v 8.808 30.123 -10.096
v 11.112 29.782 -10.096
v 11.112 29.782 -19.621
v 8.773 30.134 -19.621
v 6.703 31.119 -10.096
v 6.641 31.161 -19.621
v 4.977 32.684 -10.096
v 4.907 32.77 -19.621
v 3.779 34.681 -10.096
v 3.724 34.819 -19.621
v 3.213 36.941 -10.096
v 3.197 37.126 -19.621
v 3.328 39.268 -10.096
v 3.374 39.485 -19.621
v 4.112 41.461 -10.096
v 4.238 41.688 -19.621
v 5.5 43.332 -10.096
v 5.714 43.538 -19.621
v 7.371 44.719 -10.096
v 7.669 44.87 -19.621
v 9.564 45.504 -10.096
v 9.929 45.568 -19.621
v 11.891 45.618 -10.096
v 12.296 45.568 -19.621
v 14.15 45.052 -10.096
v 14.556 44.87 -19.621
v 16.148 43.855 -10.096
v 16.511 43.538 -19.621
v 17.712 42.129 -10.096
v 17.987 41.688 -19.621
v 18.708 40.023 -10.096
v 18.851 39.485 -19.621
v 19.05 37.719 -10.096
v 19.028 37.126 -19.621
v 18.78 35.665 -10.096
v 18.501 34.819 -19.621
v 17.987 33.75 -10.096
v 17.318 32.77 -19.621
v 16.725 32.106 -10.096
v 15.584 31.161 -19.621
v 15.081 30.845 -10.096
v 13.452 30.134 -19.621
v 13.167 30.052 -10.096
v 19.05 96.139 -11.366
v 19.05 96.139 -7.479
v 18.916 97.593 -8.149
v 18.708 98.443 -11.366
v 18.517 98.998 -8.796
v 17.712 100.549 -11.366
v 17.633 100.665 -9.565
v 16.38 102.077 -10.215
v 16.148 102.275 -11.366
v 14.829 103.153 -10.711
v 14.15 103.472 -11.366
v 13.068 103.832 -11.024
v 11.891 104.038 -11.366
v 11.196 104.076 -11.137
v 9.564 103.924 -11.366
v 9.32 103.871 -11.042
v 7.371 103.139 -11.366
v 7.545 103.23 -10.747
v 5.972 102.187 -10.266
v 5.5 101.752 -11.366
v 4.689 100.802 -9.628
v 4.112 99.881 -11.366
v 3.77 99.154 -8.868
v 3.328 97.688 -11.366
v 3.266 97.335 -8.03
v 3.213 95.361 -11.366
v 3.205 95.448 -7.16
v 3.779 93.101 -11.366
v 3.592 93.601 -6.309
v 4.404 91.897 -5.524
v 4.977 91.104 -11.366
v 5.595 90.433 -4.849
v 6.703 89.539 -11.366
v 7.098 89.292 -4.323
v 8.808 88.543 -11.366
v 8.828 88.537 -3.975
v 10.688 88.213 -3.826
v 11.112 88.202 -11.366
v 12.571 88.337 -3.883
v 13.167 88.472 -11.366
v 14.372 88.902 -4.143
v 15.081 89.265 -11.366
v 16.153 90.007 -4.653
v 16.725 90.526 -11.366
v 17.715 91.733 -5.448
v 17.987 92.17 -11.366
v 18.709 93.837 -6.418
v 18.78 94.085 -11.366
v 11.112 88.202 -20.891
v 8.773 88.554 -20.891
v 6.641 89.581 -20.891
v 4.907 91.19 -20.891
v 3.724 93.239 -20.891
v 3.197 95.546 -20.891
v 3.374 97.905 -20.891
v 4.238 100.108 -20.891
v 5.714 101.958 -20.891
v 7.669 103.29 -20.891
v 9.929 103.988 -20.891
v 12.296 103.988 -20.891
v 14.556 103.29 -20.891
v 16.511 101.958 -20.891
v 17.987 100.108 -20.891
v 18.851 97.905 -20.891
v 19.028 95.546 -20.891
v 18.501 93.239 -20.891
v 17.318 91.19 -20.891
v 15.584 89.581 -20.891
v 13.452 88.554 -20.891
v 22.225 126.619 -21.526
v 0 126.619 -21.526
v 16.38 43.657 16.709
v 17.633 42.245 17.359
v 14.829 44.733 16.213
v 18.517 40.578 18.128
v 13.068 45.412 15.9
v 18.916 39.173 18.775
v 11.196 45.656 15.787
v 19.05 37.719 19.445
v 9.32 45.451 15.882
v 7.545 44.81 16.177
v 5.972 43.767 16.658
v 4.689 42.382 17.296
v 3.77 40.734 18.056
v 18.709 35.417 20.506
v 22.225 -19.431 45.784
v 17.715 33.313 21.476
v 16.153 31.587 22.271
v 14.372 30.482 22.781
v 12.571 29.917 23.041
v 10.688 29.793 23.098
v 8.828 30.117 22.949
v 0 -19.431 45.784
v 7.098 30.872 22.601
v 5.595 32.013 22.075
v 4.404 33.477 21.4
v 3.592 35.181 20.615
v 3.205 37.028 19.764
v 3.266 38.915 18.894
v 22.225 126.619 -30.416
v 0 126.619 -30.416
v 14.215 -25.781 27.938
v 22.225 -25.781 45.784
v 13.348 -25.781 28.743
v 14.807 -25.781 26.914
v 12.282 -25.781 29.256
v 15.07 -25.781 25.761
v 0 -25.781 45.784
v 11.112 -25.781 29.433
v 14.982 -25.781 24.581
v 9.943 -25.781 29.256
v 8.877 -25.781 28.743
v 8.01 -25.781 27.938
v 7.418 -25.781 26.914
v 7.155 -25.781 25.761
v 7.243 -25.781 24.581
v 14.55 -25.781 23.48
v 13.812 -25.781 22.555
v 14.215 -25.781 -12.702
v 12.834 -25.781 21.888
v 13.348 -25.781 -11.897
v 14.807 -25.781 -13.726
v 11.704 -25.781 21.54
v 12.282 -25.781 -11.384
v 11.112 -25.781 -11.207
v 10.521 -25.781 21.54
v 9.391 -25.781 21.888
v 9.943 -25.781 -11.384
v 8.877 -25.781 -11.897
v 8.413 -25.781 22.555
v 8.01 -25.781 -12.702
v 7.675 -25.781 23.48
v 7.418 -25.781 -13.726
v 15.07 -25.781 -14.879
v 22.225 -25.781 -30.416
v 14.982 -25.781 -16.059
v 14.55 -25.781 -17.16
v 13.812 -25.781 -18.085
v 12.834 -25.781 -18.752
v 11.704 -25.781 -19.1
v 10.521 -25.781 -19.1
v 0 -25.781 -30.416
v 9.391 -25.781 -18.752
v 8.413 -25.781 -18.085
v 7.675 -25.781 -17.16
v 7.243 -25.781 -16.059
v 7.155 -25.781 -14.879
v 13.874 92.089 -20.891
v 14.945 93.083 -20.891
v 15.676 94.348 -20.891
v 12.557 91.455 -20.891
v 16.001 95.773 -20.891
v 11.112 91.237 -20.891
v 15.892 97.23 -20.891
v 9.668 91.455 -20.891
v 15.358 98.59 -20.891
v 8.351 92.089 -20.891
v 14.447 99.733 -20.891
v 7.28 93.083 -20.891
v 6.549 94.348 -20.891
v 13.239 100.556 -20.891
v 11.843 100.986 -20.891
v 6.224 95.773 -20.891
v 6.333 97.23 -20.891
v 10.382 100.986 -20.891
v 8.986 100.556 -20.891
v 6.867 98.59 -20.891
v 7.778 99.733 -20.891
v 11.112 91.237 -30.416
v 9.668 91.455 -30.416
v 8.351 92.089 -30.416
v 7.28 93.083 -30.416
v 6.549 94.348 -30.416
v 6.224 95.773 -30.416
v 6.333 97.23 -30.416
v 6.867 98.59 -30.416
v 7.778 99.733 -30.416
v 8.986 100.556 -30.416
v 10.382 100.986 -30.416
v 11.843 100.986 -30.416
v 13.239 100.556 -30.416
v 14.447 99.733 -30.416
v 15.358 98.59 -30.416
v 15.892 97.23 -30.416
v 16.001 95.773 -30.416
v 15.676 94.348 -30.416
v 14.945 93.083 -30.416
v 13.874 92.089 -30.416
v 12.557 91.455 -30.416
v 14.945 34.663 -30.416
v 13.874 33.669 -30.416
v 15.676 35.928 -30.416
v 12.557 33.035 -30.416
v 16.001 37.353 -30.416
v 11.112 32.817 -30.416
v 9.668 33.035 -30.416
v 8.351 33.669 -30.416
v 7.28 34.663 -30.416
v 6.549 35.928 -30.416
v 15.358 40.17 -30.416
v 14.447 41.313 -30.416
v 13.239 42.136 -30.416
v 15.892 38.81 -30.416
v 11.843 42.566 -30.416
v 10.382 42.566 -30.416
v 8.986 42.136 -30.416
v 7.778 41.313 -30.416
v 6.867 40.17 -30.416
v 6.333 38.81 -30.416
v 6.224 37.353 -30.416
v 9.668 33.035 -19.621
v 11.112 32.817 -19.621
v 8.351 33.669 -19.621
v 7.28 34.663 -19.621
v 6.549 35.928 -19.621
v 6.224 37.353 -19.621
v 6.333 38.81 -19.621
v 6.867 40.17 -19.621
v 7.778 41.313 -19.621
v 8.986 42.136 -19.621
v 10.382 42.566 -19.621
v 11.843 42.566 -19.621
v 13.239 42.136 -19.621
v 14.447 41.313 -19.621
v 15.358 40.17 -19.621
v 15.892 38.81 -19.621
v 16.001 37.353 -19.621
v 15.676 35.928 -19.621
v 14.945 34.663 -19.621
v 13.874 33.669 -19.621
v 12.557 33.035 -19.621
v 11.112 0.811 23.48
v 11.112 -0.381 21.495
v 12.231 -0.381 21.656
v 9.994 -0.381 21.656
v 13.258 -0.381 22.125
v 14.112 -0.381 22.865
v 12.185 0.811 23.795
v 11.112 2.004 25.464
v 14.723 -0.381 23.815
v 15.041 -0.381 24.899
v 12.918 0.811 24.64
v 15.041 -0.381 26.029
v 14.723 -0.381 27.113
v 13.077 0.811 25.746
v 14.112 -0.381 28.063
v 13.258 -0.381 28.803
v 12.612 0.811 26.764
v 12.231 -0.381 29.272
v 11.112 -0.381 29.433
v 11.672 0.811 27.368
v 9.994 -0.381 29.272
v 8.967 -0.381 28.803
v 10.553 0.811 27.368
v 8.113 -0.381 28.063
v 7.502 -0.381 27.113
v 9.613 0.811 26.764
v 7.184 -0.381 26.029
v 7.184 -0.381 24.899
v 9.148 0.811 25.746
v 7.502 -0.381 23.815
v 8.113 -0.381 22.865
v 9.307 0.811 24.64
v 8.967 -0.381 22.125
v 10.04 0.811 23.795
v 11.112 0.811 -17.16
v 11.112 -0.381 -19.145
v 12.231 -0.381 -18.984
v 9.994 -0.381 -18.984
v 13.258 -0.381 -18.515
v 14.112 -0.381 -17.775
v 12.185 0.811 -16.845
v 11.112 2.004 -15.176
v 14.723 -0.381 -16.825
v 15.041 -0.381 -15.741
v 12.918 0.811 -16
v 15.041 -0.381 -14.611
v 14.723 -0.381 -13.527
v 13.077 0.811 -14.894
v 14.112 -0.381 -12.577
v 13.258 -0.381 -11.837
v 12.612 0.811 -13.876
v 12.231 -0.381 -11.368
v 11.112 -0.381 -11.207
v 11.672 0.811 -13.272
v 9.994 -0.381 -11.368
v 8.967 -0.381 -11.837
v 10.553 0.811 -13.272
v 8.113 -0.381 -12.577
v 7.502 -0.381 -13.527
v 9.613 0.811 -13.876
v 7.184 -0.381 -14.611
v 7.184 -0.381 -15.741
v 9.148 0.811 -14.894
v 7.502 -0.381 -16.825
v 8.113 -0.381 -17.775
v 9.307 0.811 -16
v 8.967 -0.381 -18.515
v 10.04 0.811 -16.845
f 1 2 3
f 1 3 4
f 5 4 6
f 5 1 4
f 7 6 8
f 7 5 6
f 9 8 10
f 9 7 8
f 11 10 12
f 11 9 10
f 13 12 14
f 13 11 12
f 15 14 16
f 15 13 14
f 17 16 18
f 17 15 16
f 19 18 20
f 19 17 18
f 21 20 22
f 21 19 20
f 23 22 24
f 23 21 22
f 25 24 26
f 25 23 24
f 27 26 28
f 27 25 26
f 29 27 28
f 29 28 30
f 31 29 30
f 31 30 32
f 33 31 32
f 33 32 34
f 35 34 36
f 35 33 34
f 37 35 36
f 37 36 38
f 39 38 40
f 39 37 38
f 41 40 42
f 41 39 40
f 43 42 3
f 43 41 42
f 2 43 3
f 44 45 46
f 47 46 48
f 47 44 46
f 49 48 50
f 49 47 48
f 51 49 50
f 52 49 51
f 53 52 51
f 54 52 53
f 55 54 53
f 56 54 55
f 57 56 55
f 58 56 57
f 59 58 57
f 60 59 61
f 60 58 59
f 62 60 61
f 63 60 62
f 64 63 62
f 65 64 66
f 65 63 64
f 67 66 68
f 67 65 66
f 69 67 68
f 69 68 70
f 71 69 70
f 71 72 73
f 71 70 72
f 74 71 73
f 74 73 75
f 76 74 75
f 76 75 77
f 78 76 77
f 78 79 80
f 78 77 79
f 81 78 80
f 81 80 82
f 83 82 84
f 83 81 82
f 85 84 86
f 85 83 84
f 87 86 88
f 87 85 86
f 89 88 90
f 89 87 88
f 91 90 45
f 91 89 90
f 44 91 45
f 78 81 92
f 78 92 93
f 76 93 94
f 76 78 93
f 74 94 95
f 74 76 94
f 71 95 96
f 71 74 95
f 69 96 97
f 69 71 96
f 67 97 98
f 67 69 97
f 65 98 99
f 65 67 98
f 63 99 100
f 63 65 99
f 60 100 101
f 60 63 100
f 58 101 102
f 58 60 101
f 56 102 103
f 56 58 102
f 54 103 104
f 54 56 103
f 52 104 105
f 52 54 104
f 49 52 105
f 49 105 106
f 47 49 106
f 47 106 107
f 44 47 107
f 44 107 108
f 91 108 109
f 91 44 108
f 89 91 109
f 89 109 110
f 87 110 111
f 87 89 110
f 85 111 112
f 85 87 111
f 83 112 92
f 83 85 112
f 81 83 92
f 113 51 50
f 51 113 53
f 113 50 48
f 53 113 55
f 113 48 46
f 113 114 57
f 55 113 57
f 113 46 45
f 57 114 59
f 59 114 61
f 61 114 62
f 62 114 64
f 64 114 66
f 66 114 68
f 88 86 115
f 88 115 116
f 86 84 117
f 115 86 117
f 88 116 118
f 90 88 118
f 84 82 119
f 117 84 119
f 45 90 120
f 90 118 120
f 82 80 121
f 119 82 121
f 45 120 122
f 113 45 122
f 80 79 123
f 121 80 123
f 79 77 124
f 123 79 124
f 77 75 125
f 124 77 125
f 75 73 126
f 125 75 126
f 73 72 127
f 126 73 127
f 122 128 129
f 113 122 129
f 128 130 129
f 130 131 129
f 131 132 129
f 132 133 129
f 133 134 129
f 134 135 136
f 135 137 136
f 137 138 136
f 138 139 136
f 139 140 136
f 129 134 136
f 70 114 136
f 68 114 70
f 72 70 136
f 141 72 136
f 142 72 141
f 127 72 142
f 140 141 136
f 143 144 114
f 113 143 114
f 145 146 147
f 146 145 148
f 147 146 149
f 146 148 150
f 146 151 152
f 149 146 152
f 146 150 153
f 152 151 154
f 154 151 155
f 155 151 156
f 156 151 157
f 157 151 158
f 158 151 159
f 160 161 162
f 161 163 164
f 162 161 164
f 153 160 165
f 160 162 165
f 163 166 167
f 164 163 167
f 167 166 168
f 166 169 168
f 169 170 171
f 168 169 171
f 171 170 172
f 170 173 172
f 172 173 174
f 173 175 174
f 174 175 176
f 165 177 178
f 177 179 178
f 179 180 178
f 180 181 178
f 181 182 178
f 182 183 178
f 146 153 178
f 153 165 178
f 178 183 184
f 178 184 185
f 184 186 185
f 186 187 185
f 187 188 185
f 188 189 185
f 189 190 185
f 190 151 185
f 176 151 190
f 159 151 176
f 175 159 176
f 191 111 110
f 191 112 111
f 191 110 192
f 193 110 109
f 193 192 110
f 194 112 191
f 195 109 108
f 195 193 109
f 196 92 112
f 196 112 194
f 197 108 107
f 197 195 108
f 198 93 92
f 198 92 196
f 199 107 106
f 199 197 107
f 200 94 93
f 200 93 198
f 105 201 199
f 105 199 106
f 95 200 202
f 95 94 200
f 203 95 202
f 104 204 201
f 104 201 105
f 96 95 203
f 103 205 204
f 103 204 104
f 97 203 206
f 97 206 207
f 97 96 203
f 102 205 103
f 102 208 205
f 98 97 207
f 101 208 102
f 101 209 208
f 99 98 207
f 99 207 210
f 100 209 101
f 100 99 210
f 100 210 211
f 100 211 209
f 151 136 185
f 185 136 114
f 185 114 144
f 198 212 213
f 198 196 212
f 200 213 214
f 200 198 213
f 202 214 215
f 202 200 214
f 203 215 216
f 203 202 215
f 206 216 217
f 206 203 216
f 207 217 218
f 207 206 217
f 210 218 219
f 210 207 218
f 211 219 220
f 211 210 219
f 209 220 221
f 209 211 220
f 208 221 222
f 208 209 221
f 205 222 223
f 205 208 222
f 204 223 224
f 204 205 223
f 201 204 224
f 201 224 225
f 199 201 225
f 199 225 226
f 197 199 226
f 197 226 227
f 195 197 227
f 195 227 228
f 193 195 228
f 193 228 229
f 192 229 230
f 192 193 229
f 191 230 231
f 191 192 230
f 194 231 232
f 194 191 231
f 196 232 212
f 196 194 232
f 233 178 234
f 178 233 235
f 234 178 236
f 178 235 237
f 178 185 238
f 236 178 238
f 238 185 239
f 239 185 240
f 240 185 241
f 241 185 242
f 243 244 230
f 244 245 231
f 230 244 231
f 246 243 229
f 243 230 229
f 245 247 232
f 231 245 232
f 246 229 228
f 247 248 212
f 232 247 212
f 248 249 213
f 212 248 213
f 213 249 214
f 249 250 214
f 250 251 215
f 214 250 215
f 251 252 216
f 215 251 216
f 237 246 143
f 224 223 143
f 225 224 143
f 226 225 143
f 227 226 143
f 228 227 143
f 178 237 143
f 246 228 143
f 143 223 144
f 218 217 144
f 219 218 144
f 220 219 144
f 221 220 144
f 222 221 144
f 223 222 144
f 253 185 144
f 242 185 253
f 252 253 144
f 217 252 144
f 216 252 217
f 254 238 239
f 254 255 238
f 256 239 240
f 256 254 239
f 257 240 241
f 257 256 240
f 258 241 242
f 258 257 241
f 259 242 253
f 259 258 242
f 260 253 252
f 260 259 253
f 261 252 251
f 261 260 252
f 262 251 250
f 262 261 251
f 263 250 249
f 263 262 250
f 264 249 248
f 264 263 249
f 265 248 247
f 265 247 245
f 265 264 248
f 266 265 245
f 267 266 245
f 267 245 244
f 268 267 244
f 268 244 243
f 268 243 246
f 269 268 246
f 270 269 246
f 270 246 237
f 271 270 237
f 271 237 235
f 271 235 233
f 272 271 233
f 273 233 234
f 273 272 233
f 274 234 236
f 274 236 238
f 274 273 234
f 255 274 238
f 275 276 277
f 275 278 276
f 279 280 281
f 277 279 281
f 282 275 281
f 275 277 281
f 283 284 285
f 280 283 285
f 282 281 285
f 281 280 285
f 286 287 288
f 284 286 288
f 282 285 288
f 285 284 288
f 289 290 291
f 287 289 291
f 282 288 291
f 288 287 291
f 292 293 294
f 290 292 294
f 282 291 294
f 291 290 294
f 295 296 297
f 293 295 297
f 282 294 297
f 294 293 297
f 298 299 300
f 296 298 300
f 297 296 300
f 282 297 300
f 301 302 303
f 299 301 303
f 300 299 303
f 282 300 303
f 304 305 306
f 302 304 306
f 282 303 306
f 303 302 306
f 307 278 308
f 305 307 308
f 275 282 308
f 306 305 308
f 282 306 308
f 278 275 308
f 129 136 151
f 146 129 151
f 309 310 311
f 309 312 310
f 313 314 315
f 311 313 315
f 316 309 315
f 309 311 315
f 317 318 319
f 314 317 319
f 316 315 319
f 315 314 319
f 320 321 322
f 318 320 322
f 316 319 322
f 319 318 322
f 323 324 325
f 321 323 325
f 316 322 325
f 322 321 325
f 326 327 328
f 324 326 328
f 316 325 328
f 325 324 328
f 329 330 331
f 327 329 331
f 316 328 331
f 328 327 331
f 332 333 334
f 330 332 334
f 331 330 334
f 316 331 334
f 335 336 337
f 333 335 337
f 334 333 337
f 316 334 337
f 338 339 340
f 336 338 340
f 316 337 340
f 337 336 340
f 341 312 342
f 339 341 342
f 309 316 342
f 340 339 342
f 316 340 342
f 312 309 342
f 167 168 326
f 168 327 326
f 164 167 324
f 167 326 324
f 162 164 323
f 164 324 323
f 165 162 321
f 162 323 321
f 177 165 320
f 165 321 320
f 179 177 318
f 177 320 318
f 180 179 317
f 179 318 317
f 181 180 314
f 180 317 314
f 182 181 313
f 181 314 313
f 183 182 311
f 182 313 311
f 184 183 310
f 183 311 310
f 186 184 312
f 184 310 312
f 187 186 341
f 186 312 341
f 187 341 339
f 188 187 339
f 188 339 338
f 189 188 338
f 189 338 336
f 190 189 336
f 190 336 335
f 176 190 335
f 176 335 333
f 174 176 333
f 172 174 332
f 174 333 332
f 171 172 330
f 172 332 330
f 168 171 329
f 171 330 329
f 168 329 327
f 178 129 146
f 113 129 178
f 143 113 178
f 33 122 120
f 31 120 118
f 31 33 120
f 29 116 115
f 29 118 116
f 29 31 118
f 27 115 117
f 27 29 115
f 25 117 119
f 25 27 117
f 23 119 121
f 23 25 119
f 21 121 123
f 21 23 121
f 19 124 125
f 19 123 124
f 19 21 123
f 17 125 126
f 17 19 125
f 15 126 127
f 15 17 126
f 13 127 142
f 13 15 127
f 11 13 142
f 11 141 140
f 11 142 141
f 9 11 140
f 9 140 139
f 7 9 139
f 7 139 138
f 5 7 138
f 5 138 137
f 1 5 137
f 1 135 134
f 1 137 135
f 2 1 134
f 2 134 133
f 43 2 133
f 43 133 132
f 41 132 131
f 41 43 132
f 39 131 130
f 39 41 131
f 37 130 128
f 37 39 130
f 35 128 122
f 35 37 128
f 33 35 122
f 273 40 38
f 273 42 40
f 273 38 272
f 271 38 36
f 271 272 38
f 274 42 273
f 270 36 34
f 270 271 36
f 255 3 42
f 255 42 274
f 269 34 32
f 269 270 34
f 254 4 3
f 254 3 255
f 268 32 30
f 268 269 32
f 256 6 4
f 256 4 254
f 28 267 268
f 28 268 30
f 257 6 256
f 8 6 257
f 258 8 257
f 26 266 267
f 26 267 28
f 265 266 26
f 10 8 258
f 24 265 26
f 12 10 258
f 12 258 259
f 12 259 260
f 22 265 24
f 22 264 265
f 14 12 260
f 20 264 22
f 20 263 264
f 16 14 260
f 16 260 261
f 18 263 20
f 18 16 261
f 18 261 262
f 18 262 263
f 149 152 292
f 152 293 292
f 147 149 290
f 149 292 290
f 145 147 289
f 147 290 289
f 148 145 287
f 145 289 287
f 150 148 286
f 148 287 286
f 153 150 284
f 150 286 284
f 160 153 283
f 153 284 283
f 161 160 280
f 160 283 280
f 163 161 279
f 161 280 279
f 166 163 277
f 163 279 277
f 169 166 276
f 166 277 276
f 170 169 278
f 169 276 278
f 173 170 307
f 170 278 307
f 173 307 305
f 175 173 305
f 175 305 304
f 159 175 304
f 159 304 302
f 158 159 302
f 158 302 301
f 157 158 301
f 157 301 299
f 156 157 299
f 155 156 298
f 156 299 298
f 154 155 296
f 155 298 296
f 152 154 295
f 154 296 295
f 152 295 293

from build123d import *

# Parameters (mm, degrees)
BOSS_EXTRUDE2_DEPTH         = 22.225
CUT_EXTRUDE2_REACH          = 59.15
SKETCH7_R                   = 7.9375
F_3_8_16_TAPPED_HOLE1_D     = 7.9375
F_3_8_16_TAPPED_HOLE1_DEPTH = 25.4
F_3_8_16_TAPPED_HOLE1_TIP   = 2.384665582


with BuildPart() as part:
    # Sketch1 → Boss-Extrude2 (new body)
    with BuildSketch(Plane(origin=(0, 0, 0), x_dir=(0, 0, -1), z_dir=(1, 0, 0))):
        Polygon((21.525976172, 126.619), (-45.784023828, -19.431), (-45.784023828, -25.781), (30.415976172, -25.781), (30.415976172, 126.619), align=None)
    extrude(amount=BOSS_EXTRUDE2_DEPTH)

    # Sketch4 → CBORE for 3/8 Socket Head Cap Screw1 (revolve, cut)
    with BuildSketch(Plane(origin=(11.1125, 96.139, -11.365976172), x_dir=(0, -1, 0), z_dir=(1, 0, 0))):
        Polygon((0, 0), (0, 19.05), (4.9022, 19.05), (4.9022, 9.525), (7.9375, 9.525), (7.9375, 0), align=None)
    revolve(axis=Axis((11.1125, 96.139, -5.015976172), (0, 0, -1)), mode=Mode.SUBTRACT)

    # Sketch6 → CBORE for 3/8 Socket Head Cap Screw2 (revolve, cut)
    with BuildSketch(Plane(origin=(11.1125, 37.719, -10.095976172), x_dir=(0, -1, 0), z_dir=(1, 0, 0))):
        Polygon((0, 0), (0, 20.32), (4.9022, 20.32), (4.9022, 9.525), (7.9375, 9.525), (7.9375, 0), align=None)
    revolve(axis=Axis((11.1125, 37.719, -3.745976172), (0, 0, -1)), mode=Mode.SUBTRACT)

    # Sketch7 → Cut-Extrude2 (cut, up to next)
    with BuildSketch(Plane(origin=(0, 96.139, -11.365976172), x_dir=(1, 0, 0), z_dir=(0, 0, 1)), mode=Mode.PRIVATE) as cut_extrude2_sk1:
        with Locations((11.1125, -58.42)):
            Circle(SKETCH7_R)
    cut_extrude2_tool1 = extrude(cut_extrude2_sk1.sketch, amount=CUT_EXTRUDE2_REACH, mode=Mode.PRIVATE) & part.part
    add(cut_extrude2_tool1.solids().sort_by_distance((11.1125, 37.719, -11.365976))[0], mode=Mode.SUBTRACT)
    # Sketch7 → Cut-Extrude2 (cut, up to next)
    with BuildSketch(Plane(origin=(0, 96.139, -11.365976172), x_dir=(1, 0, 0), z_dir=(0, 0, 1)), mode=Mode.PRIVATE) as cut_extrude2_sk2:
        with Locations((11.1125, 0)):
            Circle(SKETCH7_R)
    cut_extrude2_tool2 = extrude(cut_extrude2_sk2.sketch, amount=CUT_EXTRUDE2_REACH, mode=Mode.PRIVATE) & part.part
    add(cut_extrude2_tool2.solids().sort_by_distance((11.1125, 96.139, -11.365976))[0], mode=Mode.SUBTRACT)

    # 3/8-16 Tapped Hole1
    with Locations(Plane(origin=(11.1125, -25.781, -15.175976172), x_dir=(0, 0, -1), z_dir=(0, -1, 0))):
        with Locations((0, 0), (-40.64, 0)):
            Hole(F_3_8_16_TAPPED_HOLE1_D / 2, depth=F_3_8_16_TAPPED_HOLE1_DEPTH)
            with Locations((0, 0, -(F_3_8_16_TAPPED_HOLE1_DEPTH + F_3_8_16_TAPPED_HOLE1_TIP / 2))):  # 118° drill point
                Cone(0, F_3_8_16_TAPPED_HOLE1_D / 2, F_3_8_16_TAPPED_HOLE1_TIP, mode=Mode.SUBTRACT)


solid = part.part
